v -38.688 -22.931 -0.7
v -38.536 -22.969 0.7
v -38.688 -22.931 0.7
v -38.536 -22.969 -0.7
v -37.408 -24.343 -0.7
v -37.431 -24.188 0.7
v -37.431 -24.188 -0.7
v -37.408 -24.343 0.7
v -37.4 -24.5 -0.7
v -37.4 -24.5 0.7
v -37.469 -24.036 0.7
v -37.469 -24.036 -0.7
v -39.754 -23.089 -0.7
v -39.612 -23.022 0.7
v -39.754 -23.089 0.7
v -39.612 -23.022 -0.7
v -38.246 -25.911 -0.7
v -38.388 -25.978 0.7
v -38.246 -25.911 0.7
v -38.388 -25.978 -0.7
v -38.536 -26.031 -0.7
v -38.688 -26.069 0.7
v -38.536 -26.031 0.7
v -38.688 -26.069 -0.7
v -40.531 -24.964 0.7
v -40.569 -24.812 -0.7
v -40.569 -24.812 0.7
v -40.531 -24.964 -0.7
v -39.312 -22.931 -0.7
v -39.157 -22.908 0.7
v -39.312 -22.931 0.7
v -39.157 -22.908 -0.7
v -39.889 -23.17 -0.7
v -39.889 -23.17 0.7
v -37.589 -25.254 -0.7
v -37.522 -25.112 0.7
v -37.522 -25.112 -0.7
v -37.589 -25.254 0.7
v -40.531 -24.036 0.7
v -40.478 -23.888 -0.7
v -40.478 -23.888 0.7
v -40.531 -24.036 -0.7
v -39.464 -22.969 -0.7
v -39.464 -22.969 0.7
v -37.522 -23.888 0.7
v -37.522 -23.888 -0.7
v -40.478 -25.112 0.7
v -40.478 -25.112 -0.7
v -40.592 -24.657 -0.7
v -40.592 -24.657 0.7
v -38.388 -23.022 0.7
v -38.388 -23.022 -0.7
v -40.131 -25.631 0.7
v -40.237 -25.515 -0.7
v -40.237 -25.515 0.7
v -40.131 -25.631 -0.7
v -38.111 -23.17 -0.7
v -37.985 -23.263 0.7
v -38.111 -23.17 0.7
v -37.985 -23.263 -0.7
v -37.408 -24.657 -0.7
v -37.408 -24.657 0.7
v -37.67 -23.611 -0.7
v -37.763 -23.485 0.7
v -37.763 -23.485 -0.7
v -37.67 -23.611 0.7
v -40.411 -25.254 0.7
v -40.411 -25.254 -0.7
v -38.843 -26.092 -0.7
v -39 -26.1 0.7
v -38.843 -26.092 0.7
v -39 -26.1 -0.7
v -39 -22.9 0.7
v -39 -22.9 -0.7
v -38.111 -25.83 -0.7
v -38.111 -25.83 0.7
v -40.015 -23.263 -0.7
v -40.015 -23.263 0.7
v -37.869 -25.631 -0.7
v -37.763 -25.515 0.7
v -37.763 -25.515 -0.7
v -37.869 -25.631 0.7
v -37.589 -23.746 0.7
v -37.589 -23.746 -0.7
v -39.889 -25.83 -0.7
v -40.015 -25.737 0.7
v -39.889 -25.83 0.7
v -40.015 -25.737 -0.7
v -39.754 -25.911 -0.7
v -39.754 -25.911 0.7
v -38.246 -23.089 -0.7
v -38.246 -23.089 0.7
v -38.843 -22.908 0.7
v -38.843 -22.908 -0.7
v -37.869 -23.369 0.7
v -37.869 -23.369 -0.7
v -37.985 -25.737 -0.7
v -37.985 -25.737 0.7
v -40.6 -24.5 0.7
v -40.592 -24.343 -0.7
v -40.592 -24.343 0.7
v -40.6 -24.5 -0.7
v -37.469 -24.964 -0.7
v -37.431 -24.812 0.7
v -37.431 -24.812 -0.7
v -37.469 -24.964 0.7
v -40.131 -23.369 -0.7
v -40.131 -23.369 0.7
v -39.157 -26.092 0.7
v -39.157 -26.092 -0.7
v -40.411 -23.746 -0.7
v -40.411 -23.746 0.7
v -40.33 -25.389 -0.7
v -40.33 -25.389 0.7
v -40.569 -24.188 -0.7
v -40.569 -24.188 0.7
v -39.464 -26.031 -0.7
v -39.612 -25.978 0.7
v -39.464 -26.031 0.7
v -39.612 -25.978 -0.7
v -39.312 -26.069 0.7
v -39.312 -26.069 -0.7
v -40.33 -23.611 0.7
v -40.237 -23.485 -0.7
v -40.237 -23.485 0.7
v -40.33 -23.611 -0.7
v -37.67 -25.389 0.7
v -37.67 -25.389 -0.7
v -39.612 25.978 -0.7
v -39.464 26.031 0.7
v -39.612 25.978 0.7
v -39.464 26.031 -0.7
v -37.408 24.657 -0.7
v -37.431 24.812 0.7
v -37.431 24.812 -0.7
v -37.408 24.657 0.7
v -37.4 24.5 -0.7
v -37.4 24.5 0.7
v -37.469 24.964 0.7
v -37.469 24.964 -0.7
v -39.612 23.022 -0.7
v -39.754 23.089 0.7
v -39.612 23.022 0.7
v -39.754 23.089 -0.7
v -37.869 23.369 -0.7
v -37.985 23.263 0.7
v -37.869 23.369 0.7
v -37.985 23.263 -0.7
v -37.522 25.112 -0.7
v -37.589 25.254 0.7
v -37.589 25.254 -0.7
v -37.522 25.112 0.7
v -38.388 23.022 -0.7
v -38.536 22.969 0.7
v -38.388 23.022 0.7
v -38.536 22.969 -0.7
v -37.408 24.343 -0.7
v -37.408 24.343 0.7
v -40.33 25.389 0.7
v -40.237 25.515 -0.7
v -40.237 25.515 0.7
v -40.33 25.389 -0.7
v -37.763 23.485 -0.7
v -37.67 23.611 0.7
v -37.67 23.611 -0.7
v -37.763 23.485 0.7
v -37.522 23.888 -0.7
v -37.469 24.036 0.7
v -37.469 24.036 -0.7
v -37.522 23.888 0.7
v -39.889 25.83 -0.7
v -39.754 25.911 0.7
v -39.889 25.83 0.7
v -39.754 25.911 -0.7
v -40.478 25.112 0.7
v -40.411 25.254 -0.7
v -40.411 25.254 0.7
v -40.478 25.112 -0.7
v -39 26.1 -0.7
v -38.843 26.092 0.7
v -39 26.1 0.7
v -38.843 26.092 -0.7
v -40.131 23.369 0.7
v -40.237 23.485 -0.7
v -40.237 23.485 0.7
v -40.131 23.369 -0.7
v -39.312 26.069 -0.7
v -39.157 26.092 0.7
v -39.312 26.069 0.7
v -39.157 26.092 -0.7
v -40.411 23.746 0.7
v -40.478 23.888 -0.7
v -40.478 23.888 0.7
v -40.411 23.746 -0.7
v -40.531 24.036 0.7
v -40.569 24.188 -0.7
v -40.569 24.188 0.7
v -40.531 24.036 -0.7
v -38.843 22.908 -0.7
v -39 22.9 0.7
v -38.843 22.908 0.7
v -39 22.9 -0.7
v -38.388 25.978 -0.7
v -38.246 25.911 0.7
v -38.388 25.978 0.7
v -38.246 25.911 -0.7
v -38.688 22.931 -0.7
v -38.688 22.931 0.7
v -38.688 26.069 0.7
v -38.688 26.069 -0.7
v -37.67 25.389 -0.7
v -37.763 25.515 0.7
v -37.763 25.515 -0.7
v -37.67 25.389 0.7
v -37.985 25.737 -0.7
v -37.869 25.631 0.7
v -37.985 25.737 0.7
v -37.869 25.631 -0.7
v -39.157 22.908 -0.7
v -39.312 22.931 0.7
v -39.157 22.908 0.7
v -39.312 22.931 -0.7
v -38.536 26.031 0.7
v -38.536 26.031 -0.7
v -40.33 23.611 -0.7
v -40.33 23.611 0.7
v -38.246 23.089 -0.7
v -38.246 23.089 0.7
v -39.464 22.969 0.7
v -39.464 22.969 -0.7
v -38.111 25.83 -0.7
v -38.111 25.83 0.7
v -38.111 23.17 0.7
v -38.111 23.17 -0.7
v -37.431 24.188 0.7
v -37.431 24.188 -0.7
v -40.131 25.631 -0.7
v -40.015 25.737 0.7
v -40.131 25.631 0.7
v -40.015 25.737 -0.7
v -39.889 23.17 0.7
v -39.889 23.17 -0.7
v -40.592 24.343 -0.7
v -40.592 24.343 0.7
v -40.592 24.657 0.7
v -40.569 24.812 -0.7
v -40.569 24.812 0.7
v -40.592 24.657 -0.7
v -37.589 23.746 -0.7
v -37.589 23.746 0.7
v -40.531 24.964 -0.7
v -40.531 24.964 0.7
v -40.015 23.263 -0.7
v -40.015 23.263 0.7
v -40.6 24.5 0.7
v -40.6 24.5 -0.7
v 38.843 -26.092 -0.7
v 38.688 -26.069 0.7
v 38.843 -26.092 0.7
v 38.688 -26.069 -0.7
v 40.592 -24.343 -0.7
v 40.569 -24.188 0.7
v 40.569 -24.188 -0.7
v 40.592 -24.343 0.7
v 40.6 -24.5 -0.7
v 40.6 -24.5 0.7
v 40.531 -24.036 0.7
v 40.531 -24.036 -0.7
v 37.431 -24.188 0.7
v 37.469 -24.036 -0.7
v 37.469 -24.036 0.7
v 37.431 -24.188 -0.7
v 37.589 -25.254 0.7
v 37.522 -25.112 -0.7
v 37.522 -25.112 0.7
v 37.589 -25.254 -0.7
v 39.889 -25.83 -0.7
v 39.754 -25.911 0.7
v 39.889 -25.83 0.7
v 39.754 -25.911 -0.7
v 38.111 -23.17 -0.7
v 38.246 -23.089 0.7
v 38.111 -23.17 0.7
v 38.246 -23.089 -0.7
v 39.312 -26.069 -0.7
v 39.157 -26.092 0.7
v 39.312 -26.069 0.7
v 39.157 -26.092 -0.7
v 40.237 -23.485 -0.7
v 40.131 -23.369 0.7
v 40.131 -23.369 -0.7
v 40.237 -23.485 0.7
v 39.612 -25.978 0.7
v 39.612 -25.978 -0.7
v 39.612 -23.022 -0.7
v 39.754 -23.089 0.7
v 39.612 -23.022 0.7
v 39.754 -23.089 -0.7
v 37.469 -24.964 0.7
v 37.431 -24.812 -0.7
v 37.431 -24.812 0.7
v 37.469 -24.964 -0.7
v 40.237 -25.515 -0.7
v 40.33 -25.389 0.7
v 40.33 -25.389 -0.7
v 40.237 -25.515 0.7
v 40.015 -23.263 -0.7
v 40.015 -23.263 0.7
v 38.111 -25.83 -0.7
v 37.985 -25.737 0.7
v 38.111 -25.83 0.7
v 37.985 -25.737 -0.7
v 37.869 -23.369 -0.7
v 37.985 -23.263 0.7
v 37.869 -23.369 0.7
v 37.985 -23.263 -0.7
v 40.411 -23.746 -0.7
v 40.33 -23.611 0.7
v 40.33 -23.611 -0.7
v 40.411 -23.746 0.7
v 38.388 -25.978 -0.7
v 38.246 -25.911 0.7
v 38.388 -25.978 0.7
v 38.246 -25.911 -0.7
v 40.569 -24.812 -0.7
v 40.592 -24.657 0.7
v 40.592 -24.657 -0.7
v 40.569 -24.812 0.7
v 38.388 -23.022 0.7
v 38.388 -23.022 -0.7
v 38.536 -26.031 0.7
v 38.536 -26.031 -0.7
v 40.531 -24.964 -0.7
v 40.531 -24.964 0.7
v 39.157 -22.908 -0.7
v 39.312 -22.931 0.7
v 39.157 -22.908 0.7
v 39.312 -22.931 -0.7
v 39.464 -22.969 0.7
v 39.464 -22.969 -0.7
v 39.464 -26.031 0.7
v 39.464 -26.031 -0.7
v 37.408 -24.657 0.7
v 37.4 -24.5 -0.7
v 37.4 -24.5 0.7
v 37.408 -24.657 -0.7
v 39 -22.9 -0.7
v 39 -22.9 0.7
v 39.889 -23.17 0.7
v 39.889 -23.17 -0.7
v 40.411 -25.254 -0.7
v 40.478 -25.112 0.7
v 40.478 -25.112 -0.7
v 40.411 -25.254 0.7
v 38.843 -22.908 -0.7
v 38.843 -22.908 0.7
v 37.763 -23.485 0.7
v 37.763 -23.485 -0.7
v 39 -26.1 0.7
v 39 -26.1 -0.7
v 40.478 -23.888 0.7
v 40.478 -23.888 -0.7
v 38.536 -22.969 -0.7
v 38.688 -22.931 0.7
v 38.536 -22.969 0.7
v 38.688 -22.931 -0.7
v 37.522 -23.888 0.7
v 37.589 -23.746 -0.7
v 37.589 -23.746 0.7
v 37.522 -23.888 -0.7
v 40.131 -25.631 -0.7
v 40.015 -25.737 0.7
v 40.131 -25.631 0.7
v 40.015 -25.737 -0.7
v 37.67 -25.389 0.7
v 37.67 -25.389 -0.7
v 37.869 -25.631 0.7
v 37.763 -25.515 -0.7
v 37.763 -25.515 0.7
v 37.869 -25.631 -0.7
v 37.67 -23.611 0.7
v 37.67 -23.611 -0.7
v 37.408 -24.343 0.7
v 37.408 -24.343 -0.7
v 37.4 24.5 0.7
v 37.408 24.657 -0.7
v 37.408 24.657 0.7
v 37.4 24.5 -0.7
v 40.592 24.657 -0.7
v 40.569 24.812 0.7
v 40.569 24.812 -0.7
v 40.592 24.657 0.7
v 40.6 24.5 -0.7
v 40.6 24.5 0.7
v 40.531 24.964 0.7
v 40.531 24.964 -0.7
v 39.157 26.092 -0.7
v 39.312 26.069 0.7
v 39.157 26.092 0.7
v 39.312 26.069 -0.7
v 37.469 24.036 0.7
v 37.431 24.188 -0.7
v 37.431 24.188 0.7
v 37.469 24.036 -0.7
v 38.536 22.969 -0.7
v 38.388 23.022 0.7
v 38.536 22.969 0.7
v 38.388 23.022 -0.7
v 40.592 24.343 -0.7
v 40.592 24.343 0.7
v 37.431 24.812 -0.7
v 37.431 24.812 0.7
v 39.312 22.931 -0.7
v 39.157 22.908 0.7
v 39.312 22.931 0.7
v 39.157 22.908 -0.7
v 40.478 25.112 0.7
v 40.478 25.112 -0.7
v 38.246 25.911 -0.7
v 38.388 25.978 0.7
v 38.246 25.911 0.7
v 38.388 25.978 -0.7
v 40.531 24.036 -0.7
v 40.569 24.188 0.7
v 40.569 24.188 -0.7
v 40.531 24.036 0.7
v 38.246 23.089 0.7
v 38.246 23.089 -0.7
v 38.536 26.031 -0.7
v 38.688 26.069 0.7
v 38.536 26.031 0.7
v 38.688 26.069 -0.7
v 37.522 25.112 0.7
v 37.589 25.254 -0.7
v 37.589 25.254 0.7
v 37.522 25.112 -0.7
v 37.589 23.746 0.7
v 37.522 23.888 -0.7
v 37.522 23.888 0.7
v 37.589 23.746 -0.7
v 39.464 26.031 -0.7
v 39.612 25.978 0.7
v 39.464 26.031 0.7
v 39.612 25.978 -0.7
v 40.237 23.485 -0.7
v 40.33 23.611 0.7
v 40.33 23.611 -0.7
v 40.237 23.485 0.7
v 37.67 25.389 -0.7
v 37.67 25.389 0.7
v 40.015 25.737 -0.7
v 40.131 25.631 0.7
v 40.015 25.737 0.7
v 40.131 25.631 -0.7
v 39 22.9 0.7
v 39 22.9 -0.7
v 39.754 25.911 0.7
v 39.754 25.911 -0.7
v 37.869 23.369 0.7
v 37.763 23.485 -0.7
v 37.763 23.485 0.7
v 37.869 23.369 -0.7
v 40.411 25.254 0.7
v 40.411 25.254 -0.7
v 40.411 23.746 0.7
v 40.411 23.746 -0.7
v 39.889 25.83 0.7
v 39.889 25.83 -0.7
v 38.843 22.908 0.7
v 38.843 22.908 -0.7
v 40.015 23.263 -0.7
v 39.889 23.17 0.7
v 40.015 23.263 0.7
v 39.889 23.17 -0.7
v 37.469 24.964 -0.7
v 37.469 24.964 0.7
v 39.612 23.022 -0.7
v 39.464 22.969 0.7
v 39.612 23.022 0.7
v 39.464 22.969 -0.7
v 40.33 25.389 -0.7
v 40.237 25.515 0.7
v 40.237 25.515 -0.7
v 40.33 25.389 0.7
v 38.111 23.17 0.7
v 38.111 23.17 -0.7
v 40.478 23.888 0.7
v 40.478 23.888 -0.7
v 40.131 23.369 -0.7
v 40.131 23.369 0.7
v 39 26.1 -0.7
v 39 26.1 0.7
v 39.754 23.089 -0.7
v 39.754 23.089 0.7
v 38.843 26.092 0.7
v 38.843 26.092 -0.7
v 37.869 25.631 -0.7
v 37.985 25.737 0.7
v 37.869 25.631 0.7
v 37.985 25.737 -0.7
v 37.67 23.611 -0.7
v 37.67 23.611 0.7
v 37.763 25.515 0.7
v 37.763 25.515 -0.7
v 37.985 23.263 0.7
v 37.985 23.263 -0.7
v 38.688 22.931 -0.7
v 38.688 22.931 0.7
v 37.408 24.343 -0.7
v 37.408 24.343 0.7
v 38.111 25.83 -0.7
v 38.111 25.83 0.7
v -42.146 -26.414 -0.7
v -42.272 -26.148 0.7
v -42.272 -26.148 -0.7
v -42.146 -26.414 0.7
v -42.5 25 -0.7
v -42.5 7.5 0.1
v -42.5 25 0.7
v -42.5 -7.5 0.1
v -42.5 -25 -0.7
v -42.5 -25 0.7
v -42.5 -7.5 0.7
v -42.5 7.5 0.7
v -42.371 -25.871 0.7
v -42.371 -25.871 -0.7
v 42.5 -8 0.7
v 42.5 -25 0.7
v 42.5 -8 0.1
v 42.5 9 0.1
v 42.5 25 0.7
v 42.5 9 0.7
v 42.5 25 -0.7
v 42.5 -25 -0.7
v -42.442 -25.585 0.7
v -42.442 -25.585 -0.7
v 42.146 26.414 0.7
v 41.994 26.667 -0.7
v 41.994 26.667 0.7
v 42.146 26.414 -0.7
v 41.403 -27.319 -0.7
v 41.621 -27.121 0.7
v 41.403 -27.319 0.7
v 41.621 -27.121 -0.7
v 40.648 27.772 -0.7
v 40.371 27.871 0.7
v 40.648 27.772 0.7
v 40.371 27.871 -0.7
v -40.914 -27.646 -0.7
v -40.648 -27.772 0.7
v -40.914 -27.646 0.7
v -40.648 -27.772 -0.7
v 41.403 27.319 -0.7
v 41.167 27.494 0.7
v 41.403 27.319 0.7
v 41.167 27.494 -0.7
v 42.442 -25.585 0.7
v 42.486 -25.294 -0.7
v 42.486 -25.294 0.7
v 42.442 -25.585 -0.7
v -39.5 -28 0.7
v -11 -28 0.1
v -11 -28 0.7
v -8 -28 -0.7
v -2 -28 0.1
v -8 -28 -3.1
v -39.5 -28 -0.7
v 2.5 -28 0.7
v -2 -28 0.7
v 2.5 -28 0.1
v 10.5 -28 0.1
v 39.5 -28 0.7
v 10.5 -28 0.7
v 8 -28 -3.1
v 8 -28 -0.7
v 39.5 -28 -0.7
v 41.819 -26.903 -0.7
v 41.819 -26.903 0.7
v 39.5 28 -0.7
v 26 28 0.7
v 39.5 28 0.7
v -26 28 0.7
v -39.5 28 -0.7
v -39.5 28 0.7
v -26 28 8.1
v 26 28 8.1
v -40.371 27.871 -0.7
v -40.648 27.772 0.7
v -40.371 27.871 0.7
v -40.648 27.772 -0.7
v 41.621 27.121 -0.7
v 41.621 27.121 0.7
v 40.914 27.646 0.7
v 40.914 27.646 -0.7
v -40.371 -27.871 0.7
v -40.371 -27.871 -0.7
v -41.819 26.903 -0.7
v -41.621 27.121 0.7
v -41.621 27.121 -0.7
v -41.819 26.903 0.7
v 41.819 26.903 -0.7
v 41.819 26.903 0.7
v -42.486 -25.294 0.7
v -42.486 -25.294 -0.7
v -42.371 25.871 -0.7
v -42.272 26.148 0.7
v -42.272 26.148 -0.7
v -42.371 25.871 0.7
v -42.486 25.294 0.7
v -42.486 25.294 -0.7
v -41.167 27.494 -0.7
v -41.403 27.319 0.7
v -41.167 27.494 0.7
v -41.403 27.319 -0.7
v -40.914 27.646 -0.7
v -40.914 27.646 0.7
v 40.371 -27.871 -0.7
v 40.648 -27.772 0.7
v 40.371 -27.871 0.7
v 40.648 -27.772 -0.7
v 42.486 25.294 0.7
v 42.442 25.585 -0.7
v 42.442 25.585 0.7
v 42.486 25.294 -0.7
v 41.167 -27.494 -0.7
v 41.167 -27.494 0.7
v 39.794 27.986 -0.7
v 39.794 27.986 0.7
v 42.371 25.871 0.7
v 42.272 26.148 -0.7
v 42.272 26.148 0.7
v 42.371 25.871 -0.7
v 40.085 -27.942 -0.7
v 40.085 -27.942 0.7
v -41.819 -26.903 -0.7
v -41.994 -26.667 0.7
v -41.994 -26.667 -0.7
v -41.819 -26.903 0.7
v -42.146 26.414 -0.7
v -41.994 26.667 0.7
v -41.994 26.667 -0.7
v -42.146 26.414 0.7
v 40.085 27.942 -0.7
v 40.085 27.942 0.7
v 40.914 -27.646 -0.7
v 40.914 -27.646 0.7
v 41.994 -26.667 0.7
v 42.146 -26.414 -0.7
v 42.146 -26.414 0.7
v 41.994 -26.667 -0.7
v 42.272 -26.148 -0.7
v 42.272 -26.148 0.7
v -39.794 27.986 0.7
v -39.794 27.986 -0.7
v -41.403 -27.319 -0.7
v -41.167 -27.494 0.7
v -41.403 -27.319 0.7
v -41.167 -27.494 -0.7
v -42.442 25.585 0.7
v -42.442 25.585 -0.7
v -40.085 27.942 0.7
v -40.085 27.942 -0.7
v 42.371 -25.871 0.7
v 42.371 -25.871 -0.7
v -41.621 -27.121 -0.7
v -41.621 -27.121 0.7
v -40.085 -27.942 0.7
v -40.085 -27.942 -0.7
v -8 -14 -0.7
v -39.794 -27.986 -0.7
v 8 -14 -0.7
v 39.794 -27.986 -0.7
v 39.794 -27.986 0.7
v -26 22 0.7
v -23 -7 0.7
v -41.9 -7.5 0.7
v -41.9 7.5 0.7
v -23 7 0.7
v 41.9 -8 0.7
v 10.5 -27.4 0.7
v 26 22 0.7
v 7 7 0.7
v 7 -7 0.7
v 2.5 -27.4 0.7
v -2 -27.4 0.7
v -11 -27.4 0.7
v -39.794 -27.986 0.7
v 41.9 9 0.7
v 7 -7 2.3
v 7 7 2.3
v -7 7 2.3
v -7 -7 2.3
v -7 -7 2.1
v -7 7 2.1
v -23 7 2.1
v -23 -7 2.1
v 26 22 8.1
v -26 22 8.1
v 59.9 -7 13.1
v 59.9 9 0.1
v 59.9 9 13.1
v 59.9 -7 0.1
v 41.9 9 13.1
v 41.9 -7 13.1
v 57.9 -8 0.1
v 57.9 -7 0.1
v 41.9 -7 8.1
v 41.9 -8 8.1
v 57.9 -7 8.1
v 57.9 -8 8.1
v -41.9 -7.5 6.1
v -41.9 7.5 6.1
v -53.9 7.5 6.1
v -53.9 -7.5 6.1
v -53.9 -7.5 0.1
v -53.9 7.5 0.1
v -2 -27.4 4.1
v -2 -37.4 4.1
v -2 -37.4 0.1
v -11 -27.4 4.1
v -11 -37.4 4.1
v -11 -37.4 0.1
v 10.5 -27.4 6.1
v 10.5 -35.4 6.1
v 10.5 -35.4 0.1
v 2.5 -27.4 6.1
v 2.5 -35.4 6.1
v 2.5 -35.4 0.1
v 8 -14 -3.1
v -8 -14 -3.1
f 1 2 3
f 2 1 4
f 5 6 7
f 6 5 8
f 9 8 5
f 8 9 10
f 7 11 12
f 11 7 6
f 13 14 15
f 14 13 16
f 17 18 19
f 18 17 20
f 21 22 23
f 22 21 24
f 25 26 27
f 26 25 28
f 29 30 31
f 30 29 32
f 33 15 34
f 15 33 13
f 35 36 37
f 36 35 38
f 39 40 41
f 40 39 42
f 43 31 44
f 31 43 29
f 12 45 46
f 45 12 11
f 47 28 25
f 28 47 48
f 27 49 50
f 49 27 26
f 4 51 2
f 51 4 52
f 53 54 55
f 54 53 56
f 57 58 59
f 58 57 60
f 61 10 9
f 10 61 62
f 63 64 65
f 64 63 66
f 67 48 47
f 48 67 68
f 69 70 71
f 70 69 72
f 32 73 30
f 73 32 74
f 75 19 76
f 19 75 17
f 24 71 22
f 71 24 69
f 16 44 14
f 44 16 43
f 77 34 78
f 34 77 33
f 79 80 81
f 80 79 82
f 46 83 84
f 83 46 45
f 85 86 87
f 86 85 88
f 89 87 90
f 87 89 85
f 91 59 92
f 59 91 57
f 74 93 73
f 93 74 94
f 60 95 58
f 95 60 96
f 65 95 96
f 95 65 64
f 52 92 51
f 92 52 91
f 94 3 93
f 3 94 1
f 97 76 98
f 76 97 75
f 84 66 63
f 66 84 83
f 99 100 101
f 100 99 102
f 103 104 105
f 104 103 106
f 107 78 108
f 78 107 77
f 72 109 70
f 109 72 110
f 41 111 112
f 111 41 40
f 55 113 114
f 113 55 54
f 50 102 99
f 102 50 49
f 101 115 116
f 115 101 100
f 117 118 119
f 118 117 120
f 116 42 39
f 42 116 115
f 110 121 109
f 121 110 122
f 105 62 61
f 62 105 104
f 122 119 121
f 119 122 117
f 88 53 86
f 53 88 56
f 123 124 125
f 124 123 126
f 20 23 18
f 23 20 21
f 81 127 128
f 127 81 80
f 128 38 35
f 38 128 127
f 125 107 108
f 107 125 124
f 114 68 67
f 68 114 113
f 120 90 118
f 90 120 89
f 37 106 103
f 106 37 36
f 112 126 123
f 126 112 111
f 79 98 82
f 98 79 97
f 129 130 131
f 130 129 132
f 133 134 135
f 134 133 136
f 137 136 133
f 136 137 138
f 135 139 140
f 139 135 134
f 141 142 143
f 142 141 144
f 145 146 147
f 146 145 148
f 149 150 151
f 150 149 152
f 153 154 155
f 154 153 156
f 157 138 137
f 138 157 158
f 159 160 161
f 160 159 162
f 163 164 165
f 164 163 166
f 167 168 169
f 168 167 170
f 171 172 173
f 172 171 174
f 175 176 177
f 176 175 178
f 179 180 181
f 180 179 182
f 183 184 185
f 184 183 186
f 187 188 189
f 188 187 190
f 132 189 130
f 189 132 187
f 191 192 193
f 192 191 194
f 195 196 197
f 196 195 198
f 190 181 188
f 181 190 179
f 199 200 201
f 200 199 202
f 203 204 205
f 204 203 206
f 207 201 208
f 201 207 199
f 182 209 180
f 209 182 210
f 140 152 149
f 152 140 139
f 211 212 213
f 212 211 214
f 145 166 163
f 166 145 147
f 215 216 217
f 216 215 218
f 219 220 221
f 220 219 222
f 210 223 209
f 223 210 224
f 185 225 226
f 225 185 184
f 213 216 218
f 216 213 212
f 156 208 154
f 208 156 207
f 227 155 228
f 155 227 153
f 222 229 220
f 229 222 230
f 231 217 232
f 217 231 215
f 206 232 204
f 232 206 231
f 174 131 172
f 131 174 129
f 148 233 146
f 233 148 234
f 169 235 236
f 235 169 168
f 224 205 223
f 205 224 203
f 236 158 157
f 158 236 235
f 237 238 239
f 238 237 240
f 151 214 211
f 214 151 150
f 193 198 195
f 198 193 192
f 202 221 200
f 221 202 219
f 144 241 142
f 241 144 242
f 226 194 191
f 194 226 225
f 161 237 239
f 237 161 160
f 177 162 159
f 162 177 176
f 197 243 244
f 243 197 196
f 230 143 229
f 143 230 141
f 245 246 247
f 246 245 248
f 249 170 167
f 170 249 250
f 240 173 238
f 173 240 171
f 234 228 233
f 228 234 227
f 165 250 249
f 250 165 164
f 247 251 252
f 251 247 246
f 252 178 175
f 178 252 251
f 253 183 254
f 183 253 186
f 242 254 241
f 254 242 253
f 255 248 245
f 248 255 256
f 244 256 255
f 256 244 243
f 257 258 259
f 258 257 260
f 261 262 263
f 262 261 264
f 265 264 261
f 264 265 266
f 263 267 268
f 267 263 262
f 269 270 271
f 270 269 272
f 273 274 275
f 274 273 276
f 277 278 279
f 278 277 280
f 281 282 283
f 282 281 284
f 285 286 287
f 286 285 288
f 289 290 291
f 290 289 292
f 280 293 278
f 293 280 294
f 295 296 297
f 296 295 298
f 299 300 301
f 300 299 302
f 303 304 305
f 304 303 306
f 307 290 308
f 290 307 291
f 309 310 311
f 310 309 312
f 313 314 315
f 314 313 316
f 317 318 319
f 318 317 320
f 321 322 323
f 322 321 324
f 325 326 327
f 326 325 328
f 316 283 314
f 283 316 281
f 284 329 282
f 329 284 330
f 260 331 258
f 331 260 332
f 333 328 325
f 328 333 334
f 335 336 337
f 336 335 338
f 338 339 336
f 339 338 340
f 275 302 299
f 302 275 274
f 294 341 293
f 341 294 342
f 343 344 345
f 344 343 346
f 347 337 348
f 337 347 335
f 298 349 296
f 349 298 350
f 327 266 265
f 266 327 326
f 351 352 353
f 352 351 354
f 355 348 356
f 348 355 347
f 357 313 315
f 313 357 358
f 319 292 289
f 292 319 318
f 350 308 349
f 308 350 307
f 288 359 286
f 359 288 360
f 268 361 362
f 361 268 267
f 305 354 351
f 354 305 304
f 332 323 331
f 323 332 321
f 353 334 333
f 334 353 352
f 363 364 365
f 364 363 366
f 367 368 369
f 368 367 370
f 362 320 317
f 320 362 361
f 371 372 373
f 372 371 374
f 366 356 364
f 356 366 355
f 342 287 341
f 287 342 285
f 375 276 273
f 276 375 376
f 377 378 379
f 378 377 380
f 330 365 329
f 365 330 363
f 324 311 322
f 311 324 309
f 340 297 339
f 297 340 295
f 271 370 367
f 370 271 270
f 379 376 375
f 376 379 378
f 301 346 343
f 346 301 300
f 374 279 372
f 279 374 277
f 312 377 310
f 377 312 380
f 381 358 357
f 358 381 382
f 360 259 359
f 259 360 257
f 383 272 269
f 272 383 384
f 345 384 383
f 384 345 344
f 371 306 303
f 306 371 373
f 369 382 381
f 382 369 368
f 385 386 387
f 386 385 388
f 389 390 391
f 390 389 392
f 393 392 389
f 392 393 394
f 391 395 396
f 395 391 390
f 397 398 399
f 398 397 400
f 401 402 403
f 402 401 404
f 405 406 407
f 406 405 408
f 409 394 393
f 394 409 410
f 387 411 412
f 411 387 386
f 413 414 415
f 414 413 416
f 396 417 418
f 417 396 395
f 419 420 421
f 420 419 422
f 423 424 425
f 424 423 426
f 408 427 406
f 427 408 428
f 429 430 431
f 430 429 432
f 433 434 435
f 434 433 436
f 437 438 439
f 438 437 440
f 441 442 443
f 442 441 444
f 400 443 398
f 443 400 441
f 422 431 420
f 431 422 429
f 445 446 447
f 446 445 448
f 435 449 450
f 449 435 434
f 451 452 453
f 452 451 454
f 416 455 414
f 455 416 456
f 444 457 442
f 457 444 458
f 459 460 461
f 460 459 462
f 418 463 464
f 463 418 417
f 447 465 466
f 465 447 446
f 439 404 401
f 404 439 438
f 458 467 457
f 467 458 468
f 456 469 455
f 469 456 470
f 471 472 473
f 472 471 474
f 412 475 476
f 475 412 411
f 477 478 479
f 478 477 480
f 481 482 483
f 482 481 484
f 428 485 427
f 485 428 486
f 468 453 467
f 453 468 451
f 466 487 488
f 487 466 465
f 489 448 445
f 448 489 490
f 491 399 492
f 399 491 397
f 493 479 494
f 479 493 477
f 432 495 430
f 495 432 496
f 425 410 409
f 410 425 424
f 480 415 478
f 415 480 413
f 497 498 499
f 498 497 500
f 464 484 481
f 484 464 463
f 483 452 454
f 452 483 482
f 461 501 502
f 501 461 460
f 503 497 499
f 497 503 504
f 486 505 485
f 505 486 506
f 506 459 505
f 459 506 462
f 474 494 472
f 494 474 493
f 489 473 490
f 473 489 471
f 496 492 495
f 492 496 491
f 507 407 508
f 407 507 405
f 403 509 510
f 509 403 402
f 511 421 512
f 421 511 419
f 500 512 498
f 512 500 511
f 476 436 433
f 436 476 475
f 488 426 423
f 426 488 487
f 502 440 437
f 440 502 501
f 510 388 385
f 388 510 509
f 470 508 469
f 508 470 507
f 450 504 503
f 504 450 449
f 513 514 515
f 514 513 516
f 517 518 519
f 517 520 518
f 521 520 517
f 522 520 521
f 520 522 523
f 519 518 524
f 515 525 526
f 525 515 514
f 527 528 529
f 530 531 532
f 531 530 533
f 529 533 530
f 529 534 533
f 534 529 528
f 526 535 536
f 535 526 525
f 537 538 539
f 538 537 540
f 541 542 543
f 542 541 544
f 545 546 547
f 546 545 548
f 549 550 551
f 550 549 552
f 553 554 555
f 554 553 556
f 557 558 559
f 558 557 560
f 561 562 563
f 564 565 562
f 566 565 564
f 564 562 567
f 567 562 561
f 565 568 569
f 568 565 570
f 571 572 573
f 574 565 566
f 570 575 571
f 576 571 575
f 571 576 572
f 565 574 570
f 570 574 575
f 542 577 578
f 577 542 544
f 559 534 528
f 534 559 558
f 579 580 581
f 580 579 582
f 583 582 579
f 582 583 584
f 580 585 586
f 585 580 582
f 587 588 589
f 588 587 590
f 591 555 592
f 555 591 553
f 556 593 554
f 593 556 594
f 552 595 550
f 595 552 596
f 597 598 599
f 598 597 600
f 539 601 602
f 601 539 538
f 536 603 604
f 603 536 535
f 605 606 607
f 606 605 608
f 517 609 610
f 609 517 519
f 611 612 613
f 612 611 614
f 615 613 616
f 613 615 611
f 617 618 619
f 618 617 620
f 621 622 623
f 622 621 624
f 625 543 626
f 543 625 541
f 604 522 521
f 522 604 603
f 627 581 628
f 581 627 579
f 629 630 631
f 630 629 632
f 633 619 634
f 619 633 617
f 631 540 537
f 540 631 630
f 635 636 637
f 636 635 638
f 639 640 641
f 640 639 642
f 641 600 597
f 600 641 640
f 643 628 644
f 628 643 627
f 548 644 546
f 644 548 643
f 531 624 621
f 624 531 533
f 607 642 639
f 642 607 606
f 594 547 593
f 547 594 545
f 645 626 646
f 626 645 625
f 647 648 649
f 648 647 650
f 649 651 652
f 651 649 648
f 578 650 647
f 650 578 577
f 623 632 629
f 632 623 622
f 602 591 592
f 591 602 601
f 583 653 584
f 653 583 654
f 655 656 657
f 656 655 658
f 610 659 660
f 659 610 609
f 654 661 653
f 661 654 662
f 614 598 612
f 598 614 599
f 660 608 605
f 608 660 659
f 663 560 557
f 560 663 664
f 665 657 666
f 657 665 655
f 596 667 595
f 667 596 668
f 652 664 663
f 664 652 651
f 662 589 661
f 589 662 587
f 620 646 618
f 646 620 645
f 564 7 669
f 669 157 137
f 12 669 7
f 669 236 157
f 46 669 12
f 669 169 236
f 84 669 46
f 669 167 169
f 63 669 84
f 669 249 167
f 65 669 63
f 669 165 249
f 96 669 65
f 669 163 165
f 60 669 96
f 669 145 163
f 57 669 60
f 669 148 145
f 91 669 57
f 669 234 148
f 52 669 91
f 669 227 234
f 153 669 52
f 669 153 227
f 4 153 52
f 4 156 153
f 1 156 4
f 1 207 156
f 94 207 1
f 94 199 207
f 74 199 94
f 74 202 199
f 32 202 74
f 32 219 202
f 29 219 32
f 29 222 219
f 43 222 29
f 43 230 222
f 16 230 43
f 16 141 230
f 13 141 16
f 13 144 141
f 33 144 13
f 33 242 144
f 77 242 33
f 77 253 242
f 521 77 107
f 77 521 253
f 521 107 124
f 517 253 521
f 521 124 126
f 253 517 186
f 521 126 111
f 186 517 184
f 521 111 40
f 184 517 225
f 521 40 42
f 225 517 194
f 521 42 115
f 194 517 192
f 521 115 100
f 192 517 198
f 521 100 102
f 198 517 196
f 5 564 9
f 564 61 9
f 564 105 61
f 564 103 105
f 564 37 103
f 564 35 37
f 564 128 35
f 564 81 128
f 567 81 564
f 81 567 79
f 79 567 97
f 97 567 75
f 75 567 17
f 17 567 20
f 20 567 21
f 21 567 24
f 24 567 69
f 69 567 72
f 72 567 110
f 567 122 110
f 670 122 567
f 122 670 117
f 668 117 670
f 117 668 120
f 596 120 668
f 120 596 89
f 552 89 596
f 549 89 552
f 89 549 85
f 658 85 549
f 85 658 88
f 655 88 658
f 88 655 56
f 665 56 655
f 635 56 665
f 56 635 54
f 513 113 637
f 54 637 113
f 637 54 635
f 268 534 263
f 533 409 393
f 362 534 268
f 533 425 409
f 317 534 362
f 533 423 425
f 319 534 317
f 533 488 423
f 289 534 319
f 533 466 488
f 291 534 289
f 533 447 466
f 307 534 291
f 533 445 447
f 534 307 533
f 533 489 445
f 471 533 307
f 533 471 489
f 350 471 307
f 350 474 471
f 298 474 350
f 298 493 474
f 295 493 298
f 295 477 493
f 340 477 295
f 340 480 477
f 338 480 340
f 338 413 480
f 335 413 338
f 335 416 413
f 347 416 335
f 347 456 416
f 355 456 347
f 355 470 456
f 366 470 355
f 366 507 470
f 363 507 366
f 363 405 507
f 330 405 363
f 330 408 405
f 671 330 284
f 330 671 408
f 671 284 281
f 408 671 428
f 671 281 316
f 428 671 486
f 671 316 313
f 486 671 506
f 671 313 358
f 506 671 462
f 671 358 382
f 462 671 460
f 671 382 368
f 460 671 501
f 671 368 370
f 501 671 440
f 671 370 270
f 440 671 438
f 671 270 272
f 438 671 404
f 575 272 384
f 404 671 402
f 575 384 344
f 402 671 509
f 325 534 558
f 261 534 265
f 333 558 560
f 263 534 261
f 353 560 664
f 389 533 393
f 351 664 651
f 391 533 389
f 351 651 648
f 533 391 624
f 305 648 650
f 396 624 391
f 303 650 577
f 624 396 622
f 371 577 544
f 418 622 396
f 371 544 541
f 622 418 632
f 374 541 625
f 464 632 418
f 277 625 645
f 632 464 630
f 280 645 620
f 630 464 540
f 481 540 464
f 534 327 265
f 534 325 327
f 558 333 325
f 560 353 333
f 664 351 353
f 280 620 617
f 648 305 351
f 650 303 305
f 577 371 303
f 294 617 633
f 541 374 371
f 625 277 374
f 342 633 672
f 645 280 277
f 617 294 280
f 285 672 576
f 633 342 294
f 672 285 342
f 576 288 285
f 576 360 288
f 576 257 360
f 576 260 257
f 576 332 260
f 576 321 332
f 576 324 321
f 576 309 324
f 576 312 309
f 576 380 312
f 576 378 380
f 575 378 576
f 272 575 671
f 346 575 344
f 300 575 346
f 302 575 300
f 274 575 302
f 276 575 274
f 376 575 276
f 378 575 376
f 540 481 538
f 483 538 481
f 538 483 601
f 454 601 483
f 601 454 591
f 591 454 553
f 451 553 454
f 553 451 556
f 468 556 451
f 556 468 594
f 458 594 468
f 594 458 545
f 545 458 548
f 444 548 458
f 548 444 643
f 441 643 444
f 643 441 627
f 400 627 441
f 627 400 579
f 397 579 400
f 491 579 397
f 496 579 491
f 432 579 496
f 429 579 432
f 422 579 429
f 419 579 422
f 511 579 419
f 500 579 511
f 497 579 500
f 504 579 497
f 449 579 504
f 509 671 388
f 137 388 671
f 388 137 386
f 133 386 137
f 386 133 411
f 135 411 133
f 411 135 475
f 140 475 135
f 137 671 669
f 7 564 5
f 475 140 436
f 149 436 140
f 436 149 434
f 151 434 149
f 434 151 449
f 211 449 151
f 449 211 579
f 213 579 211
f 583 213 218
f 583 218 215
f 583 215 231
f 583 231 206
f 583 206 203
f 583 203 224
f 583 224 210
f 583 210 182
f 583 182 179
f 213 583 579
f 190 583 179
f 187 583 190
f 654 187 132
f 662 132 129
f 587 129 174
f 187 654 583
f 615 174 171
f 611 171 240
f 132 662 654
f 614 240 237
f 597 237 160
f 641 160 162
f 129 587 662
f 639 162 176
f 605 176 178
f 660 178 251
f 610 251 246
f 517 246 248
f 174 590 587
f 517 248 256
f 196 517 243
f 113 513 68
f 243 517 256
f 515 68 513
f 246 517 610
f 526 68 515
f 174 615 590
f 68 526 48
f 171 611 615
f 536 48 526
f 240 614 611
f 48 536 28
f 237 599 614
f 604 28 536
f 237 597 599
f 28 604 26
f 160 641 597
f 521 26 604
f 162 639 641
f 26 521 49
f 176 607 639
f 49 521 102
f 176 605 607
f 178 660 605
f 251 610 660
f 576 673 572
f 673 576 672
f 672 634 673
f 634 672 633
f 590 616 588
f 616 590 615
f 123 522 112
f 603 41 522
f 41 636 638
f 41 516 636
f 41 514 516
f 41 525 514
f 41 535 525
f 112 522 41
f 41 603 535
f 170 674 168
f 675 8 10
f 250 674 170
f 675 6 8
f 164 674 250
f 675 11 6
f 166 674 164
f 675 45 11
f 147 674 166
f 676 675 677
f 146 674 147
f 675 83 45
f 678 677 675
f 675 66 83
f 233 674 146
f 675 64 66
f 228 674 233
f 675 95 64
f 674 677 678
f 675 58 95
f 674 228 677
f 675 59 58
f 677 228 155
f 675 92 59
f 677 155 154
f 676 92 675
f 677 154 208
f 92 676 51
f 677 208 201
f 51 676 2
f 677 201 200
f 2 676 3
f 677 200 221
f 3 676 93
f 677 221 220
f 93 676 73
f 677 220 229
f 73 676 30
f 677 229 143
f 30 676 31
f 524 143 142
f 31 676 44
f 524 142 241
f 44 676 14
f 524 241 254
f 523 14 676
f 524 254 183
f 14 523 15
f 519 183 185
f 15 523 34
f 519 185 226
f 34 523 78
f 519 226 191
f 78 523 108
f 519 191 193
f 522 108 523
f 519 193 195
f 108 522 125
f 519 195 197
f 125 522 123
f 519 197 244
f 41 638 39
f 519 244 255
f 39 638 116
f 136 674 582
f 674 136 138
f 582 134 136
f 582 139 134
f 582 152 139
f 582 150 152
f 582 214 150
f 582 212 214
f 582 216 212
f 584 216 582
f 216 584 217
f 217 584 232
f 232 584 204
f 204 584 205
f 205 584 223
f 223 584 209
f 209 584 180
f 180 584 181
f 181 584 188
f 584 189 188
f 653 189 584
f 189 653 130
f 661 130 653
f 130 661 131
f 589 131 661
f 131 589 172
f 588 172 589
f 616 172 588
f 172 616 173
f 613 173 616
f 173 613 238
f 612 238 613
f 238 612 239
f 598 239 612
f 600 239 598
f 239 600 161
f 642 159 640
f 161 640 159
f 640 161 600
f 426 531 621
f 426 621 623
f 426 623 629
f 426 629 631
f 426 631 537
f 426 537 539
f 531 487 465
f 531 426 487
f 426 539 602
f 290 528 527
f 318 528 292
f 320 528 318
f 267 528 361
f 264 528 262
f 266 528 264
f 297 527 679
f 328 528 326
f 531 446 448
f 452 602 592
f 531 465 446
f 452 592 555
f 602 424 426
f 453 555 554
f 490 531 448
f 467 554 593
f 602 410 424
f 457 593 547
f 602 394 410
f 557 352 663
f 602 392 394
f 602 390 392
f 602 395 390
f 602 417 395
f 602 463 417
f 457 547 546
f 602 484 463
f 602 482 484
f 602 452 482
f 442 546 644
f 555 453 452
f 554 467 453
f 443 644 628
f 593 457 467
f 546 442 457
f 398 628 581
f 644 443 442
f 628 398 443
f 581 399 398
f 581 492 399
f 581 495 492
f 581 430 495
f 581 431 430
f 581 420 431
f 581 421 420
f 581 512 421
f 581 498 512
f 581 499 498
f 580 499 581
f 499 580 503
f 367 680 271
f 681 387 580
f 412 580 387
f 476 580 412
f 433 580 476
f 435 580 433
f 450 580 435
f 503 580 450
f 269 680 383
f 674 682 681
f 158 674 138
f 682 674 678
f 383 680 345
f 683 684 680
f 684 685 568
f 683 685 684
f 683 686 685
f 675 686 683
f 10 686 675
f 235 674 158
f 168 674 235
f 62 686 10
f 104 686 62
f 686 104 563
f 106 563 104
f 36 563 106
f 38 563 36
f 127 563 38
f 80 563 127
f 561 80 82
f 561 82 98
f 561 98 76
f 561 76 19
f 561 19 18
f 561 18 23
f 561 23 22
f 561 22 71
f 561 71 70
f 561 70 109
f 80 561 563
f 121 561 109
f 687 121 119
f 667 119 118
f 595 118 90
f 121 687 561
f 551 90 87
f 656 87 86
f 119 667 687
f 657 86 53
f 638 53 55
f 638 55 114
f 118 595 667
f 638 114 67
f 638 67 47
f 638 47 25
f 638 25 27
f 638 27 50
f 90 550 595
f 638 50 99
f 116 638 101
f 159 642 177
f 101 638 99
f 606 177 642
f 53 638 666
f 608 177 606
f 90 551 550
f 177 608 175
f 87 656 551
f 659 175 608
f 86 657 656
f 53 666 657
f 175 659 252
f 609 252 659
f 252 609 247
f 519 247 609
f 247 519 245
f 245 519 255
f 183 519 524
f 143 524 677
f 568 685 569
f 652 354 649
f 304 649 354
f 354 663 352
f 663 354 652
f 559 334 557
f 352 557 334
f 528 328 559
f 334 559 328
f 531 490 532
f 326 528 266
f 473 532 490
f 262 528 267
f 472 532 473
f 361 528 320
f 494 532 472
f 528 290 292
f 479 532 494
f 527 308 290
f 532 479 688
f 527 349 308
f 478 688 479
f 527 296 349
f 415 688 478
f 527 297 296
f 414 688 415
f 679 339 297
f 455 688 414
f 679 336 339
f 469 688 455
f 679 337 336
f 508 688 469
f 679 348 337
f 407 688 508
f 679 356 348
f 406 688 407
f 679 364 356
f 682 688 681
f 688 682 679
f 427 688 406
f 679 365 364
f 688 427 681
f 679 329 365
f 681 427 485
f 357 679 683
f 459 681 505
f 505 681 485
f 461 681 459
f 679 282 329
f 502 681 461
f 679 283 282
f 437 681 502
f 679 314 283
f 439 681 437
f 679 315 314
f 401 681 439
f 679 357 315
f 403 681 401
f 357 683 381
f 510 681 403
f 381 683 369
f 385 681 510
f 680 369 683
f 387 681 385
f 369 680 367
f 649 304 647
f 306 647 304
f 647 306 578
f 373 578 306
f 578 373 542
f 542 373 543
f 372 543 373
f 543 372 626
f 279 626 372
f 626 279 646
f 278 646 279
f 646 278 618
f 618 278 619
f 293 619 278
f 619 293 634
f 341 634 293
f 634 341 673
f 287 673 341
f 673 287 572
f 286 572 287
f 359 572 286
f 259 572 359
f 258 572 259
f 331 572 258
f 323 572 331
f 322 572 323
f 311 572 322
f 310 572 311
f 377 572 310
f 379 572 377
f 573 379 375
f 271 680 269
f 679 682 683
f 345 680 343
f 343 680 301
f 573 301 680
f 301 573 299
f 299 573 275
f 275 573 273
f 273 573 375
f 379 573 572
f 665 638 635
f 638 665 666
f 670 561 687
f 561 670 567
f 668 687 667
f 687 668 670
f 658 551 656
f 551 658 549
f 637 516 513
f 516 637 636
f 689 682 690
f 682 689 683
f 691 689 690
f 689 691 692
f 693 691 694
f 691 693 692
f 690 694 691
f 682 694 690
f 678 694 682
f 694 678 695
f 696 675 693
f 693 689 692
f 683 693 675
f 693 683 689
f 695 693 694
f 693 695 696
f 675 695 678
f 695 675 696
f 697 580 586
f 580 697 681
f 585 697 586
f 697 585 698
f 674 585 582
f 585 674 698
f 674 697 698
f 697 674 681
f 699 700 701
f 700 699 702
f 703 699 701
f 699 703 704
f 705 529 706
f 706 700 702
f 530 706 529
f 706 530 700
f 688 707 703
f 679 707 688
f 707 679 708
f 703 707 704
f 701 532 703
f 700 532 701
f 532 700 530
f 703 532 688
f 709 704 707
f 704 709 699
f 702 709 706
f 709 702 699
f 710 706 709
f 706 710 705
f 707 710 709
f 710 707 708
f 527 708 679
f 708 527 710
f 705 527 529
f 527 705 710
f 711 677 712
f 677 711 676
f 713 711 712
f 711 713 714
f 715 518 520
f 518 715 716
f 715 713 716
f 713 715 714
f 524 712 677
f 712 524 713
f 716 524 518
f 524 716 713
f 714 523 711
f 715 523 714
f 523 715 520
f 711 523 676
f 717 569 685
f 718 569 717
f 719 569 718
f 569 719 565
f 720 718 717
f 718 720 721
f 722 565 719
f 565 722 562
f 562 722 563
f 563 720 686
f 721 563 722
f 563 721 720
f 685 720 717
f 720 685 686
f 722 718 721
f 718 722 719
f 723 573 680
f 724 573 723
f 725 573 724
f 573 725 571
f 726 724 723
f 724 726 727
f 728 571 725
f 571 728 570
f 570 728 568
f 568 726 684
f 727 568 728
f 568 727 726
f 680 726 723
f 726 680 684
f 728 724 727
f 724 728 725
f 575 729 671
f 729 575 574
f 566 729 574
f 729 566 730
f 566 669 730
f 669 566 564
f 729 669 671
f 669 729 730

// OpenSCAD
$fn = 64;

// Target dimensions (verified)
pcb_L = 85.0;
pcb_W = 56.0;
pcb_T = 1.4;

// Geometry controls
corner_R = 3.0;
overlap  = 0.6;     // intentional intersections to ensure ONE connected solid
hole_r   = 1.6;
hole_edge_offset = 3.5;

// Simple SBC-like components/connectors (recognizable)
usb_L = 16.0;   // protrusion length out of board edge (X)
usb_W = 14.0;   // along Y
usb_H = 8.0;    // above PCB

eth_L = 18.0;
eth_W = 16.0;
eth_H = 13.0;

hdmi_L = 12.0;
hdmi_W = 15.0;
hdmi_H = 6.0;

gpio_L = 52.0;
gpio_W = 6.0;
gpio_H = 8.0;

soc_L = 14.0;
soc_W = 14.0;
soc_H = 2.2;

ram_L = 18.0;
ram_W = 14.0;
ram_H = 2.0;

usbC_L = 10.0;
usbC_W = 9.0;
usbC_H = 4.0;

audio_L = 8.0;
audio_W = 8.0;
audio_H = 6.0;

sd_L = 16.0;   // underside SD slot
sd_W = 14.0;
sd_H = 3.0;

// Rounded-rectangle PCB
module pcb_solid() {
    linear_extrude(height=pcb_T, center=true)
        hull() {
            for (sx = [-1, 1], sy = [-1, 1])
                translate([sx*(pcb_L/2 - corner_R), sy*(pcb_W/2 - corner_R)])
                    circle(r=corner_R);
        }
}

// Mounting holes cut through PCB
module pcb_with_holes() {
    difference() {
        pcb_solid();
        for (sx = [-1, 1], sy = [-1, 1])
            translate([sx*(pcb_L/2 - hole_edge_offset), sy*(pcb_W/2 - hole_edge_offset), 0])
                cylinder(r=hole_r, h=pcb_T + 2, center=true);
    }
}

// Helpers: place parts with computed connectivity (no arbitrary offsets)
module on_top(pos=[0,0], size=[10,10,5]) {
    translate([pos[0], pos[1], pcb_T/2 + size[2]/2 - overlap])
        cube(size, center=true);
}
module under(pos=[0,0], size=[10,10,5]) {
    translate([pos[0], pos[1], -pcb_T/2 - size[2]/2 + overlap])
        cube(size, center=true);
}
module on_right_edge(y=0, size=[10,10,5]) {
    translate([pcb_L/2 + size[0]/2 - overlap, y, pcb_T/2 + size[2]/2 - overlap])
        cube(size, center=true);
}
module on_left_edge(y=0, size=[10,10,5]) {
    translate([-pcb_L/2 - size[0]/2 + overlap, y, pcb_T/2 + size[2]/2 - overlap])
        cube(size, center=true);
}
module on_top_edge(x=0, size=[10,10,5]) {
    translate([x, pcb_W/2 + size[1]/2 - overlap, pcb_T/2 + size[2]/2 - overlap])
        cube(size, center=true);
}
module on_bottom_edge(x=0, size=[10,10,5]) {
    translate([x, -pcb_W/2 - size[1]/2 + overlap, pcb_T/2 + size[2]/2 - overlap])
        cube(size, center=true);
}

// Complete SBC model: ONE connected solid
union() {
    // PCB
    pcb_with_holes();

    // Main SoC (top, central-ish)
    on_top([0, 0], [soc_L, soc_W, soc_H]);

    // RAM (top, near SoC)
    on_top([-(soc_L/2 + ram_L/2 - 2), 0], [ram_L, ram_W, ram_H]);

    // GPIO header along +Y edge (top)
    on_top([0, pcb_W/2 - gpio_W/2], [gpio_L, gpio_W, gpio_H]);

    // Right-side connectors (+X edge): Ethernet + USB stack (top)
    on_right_edge( (eth_W/2 - usb_W/2), [eth_L, eth_W, eth_H]);
    on_right_edge(-(eth_W/2 - usb_W/2), [usb_L, usb_W, usb_H]);

    // Left-side HDMI (-X edge, top)
    on_left_edge(0, [hdmi_L, hdmi_W, hdmi_H]);

    // Bottom edge connectors (-Y edge, top): USB-C power + audio
    on_bottom_edge(-(usbC_W/2 + audio_W/2 - 2), [usbC_W, usbC_L, usbC_H]); // rotated footprint: X=width, Y=length
    on_bottom_edge( (usbC_W/2 + audio_W/2 - 2), [audio_W, audio_L, audio_H]);

    // Underside SD slot (under, near -Y edge)
    under([0, -pcb_W/2 + sd_W/2], [sd_L, sd_W, sd_H]);
}
